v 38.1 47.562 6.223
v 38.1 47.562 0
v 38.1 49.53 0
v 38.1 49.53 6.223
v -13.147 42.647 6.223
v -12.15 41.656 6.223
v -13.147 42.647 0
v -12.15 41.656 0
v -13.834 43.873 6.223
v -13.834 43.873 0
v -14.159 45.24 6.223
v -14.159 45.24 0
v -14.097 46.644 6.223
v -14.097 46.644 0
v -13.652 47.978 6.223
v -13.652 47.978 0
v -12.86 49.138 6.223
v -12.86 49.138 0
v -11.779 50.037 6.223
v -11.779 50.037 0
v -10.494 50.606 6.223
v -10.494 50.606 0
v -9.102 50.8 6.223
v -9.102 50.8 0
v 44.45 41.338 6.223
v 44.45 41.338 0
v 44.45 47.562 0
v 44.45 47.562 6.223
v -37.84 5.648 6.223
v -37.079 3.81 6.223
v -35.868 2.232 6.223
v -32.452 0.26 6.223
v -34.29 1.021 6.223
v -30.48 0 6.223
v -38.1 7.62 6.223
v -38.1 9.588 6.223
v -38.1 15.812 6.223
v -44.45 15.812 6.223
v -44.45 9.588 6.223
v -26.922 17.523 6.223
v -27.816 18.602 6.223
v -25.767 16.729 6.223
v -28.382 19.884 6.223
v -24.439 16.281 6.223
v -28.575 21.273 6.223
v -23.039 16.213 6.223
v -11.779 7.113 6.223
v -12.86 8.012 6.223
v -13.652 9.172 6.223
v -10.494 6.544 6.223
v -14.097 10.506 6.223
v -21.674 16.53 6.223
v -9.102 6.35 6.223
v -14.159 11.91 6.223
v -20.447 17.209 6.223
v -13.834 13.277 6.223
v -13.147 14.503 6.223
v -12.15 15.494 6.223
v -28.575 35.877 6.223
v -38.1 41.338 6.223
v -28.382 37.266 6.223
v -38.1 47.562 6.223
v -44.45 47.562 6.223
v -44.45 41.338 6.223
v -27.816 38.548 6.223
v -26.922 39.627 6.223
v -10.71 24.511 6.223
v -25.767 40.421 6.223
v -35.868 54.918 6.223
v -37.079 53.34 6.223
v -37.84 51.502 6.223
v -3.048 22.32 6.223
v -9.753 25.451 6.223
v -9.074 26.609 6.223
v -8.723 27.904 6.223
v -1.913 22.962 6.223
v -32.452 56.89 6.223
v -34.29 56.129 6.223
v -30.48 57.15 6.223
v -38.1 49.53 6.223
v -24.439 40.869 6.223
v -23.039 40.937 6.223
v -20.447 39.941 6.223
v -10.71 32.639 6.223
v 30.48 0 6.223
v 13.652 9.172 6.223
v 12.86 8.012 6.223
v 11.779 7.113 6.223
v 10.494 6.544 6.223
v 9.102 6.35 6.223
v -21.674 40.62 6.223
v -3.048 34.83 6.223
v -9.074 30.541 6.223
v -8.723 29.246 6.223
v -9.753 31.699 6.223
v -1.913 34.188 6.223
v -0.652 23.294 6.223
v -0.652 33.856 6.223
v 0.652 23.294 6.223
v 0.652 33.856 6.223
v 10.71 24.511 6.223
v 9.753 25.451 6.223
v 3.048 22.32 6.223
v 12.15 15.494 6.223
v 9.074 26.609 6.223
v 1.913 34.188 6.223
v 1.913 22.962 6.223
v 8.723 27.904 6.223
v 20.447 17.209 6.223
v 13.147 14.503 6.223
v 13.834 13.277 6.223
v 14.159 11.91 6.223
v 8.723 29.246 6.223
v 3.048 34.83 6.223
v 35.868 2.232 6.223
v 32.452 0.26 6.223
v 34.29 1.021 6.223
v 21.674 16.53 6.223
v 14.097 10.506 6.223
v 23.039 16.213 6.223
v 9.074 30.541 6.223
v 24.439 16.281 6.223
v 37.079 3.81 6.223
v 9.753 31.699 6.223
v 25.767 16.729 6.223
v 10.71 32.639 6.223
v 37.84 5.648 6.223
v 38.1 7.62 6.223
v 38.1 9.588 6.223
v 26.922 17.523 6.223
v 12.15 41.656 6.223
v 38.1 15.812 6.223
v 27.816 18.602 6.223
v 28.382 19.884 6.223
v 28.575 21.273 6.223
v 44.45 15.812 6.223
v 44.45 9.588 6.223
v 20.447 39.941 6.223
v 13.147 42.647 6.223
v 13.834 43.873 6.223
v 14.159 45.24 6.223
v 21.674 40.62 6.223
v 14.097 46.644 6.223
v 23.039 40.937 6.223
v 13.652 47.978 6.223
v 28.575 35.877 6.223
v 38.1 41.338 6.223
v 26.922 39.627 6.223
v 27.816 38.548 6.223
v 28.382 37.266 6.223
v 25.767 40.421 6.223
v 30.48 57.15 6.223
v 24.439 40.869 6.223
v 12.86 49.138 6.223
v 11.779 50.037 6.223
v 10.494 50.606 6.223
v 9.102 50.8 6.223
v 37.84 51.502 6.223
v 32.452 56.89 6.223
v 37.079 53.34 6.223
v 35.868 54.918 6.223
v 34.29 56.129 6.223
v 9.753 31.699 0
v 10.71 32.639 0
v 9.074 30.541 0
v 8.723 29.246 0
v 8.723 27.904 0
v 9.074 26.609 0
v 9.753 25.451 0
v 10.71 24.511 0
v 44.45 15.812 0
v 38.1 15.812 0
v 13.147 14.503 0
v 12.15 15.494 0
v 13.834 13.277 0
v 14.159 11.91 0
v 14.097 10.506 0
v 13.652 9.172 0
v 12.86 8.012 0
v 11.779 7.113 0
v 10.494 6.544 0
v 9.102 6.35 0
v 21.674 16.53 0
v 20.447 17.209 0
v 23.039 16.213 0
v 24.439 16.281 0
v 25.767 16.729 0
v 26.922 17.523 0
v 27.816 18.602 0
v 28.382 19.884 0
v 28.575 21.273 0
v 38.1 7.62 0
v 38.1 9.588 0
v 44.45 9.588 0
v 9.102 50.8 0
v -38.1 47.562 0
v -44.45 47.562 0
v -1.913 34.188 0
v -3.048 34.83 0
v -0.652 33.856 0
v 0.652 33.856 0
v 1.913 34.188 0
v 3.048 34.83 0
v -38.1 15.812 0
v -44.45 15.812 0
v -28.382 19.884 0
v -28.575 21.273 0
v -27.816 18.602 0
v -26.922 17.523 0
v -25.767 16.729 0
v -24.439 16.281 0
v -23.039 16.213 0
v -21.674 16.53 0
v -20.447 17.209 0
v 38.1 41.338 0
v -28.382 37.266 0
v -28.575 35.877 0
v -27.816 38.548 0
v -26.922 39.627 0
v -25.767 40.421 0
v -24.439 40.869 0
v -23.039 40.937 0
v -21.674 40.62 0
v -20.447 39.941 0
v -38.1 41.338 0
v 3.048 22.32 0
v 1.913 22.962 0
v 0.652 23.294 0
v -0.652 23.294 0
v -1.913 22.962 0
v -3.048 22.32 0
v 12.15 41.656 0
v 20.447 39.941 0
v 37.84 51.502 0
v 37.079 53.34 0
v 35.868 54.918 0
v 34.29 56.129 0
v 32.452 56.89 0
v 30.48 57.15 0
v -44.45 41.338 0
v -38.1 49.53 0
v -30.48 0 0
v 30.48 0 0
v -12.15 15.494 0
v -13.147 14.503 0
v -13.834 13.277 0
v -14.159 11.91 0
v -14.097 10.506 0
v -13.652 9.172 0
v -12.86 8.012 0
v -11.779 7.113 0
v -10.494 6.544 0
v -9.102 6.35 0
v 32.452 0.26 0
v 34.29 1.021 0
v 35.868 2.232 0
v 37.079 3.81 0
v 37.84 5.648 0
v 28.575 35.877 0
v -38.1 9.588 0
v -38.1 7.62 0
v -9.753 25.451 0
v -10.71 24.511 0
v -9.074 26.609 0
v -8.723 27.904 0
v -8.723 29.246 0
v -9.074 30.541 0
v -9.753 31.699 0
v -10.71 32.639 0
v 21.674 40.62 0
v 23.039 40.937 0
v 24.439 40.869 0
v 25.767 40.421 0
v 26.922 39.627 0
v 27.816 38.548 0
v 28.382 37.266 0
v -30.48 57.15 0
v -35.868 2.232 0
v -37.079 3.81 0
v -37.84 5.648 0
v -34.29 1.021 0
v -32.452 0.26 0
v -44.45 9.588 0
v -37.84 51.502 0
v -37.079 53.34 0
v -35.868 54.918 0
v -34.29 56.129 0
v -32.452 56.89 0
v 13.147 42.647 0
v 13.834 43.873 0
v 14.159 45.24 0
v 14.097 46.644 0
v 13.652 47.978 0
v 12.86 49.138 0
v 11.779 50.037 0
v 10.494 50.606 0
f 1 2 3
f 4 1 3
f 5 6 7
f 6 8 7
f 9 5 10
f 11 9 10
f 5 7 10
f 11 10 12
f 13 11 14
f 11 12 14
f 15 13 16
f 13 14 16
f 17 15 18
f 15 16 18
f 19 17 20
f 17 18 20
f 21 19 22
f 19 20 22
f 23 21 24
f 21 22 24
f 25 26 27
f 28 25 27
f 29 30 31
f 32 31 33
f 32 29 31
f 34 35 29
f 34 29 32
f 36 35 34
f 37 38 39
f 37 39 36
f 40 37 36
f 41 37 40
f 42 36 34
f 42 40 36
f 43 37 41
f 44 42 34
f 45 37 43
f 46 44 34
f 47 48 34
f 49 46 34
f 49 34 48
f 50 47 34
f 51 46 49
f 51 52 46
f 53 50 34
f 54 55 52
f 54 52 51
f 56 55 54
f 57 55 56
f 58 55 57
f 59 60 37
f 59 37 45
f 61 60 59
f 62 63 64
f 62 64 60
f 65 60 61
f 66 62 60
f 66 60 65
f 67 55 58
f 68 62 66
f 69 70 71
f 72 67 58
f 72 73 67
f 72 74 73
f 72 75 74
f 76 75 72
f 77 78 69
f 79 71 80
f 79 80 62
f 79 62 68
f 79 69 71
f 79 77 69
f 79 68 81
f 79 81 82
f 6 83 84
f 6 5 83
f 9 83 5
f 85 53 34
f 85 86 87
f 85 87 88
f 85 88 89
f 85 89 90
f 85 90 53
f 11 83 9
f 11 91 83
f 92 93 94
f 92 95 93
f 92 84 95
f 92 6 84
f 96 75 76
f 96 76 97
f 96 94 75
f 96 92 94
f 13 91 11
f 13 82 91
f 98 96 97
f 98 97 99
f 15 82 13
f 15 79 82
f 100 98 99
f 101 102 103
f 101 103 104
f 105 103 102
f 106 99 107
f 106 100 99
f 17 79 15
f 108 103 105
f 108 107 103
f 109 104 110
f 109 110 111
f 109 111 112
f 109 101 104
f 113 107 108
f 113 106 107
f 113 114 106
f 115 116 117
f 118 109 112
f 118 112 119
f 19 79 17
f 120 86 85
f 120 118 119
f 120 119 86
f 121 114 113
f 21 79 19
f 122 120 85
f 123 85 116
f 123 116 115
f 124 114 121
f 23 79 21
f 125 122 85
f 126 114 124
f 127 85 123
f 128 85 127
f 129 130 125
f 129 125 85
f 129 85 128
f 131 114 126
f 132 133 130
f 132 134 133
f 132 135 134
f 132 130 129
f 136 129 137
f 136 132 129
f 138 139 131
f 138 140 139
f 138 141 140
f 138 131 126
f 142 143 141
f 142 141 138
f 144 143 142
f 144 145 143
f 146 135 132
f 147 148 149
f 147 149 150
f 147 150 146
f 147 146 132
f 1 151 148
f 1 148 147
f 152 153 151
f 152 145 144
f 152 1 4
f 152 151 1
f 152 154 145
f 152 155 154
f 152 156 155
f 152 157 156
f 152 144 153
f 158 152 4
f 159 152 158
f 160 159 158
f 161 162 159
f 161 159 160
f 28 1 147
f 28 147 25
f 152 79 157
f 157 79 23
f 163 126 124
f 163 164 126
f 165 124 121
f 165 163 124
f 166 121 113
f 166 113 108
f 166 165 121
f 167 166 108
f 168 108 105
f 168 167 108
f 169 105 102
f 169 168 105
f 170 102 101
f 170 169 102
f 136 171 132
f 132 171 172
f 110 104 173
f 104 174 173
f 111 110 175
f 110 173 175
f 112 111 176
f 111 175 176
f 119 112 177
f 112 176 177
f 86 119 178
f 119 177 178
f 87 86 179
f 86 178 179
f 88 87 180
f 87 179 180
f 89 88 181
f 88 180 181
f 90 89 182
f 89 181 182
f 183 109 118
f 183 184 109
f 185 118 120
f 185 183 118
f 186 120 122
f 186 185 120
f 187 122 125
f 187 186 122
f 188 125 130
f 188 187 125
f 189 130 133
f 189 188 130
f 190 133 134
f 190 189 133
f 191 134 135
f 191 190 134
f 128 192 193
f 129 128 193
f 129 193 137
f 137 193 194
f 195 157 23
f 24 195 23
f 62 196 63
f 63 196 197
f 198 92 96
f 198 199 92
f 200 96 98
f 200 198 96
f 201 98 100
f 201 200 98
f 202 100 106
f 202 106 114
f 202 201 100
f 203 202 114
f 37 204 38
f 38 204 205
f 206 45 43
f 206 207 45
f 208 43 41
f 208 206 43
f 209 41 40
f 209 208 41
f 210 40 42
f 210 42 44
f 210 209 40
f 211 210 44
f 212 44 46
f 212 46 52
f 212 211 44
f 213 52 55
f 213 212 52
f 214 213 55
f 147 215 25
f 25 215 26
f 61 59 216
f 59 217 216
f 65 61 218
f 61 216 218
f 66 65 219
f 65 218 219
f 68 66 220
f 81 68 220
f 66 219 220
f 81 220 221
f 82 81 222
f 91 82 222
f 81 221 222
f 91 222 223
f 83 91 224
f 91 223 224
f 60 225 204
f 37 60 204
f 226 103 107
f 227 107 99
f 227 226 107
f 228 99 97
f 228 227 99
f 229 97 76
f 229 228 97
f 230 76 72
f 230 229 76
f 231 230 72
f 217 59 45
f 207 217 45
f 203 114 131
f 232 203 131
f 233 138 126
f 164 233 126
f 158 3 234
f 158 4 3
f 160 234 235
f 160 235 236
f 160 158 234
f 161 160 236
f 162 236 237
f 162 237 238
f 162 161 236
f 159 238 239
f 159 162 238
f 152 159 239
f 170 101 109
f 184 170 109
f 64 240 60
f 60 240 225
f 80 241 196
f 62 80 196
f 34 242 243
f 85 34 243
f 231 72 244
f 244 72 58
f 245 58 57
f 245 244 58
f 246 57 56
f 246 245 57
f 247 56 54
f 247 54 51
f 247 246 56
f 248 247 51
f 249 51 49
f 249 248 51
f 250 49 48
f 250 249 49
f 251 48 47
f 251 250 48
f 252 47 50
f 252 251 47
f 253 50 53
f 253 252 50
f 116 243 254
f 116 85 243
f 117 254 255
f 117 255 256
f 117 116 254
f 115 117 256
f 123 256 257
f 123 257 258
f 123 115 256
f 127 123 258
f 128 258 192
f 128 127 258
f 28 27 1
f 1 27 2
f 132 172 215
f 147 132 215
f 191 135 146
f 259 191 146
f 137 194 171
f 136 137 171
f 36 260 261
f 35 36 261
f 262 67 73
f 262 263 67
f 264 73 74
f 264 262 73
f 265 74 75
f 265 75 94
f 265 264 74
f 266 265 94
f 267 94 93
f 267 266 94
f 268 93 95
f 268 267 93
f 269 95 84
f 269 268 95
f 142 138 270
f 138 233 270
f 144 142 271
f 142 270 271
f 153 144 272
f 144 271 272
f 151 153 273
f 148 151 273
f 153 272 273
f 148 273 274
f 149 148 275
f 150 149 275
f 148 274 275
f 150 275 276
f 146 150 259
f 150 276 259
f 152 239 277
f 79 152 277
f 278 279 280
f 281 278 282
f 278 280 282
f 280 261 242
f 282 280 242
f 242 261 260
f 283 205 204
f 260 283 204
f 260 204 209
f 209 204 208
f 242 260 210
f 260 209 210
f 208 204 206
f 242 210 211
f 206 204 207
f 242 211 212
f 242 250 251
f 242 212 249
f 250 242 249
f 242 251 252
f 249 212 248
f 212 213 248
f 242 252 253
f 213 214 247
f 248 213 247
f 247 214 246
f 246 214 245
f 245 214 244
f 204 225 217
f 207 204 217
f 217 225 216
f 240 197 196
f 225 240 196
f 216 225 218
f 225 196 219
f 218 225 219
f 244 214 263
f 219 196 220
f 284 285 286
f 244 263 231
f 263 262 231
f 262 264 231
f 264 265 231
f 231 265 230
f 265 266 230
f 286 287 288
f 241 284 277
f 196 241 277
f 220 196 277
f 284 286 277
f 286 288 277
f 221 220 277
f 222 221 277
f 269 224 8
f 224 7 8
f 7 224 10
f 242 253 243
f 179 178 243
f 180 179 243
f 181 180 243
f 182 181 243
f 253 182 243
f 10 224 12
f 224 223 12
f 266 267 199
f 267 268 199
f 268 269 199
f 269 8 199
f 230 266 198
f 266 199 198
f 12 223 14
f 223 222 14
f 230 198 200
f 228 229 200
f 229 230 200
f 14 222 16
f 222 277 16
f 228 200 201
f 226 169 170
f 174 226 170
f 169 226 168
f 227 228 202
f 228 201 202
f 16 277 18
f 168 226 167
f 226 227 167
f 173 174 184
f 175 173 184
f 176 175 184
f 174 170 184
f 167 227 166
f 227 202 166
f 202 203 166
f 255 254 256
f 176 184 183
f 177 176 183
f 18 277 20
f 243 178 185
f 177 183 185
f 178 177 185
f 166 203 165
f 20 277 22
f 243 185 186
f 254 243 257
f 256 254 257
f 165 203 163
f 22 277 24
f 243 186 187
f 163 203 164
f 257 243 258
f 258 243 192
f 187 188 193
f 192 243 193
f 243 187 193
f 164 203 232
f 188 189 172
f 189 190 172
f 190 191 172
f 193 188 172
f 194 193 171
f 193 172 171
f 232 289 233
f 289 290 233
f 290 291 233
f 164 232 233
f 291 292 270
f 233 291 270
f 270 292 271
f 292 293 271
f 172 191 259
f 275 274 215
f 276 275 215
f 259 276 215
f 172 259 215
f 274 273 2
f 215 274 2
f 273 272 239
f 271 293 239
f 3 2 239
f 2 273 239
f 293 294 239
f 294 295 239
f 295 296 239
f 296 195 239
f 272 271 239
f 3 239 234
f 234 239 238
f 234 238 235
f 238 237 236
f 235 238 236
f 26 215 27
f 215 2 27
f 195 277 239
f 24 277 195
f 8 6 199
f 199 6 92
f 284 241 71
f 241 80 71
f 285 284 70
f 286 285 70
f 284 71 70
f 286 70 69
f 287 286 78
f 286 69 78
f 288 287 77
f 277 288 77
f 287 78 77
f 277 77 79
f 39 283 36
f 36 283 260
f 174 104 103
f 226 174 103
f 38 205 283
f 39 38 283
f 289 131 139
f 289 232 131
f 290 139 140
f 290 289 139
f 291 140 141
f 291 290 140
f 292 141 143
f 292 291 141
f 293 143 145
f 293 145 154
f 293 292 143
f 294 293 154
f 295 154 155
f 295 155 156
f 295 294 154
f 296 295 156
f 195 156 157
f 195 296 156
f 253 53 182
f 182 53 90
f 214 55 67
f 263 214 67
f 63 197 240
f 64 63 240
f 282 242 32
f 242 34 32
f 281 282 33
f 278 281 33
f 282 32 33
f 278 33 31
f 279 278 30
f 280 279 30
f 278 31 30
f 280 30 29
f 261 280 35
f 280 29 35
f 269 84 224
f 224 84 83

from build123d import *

# Parameters (mm, degrees)
F1_DEPTH = 6.223
F3_DEPTH = 25.4
F4_R     = 5.08
F5_R     = 7.62


with BuildPart() as f1:
    # F0 (on Top) → F1 (new body)
    with BuildSketch(Plane.XY):
        Polygon((-38.1, 0), (0, 0), (38.1, 0), (38.1, 9.5885), (44.45, 9.5885), (44.45, 12.7), (44.45, 15.8115), (38.1, 15.8115), (38.1, 41.3385), (44.45, 41.3385), (44.45, 44.45), (44.45, 47.5615), (38.1, 47.5615), (38.1, 57.15), (0, 57.15), (-38.1, 57.15), (-38.1, 47.5615), (-44.45, 47.5615), (-44.45, 44.45), (-44.45, 41.3385), (-38.1, 41.3385), (-38.1, 15.8115), (-44.45, 15.8115), (-44.45, 12.7), (-44.45, 9.5885), (-38.1, 9.5885), align=None)
    extrude(amount=F1_DEPTH)

    # F2 (on face) → F3 (cut)
    with BuildSketch(Plane.XY.offset(6.223)):
        Polygon((-28.575, 46.0375), (-28.575, 11.1125), (-5.291667, 28.575), align=None)
        Polygon((-24.341667, 50.8), (0, 32.54375), (24.341667, 50.8), align=None)
        Polygon((28.575, 46.0375), (5.291667, 28.575), (28.575, 11.1125), align=None)
        Polygon((24.341667, 6.35), (0, 24.60625), (-24.341667, 6.35), align=None)
    extrude(amount=-F3_DEPTH, mode=Mode.SUBTRACT)

    # F4
    f4_edges = [f1.edges().sort_by_distance(p)[0] for p in [
        (-28.575, 11.1125, 3.1115),
        (-28.575, 46.0375, 3.1115),
        (-5.291667, 28.575, 3.1115),
        (24.341667, 6.35, 3.1115),
        (0, 24.60625, 3.1115),
        (-24.341667, 6.35, 3.1115),
        (28.575, 11.1125, 3.1115),
        (28.575, 46.0375, 3.1115),
        (5.291667, 28.575, 3.1115),
        (0, 32.54375, 3.1115),
        (24.341667, 50.8, 3.1115),
        (-24.341667, 50.8, 3.1115),
    ]]
    fillet(f4_edges, radius=F4_R)

    # F5
    f5_edges = [f1.edges().sort_by_distance(p)[0] for p in [
        (-38.1, 57.15, 3.1115),
        (38.1, 57.15, 3.1115),
        (38.1, 0, 3.1115),
        (-38.1, 0, 3.1115),
    ]]
    fillet(f5_edges, radius=F5_R)


solid = f1.part
